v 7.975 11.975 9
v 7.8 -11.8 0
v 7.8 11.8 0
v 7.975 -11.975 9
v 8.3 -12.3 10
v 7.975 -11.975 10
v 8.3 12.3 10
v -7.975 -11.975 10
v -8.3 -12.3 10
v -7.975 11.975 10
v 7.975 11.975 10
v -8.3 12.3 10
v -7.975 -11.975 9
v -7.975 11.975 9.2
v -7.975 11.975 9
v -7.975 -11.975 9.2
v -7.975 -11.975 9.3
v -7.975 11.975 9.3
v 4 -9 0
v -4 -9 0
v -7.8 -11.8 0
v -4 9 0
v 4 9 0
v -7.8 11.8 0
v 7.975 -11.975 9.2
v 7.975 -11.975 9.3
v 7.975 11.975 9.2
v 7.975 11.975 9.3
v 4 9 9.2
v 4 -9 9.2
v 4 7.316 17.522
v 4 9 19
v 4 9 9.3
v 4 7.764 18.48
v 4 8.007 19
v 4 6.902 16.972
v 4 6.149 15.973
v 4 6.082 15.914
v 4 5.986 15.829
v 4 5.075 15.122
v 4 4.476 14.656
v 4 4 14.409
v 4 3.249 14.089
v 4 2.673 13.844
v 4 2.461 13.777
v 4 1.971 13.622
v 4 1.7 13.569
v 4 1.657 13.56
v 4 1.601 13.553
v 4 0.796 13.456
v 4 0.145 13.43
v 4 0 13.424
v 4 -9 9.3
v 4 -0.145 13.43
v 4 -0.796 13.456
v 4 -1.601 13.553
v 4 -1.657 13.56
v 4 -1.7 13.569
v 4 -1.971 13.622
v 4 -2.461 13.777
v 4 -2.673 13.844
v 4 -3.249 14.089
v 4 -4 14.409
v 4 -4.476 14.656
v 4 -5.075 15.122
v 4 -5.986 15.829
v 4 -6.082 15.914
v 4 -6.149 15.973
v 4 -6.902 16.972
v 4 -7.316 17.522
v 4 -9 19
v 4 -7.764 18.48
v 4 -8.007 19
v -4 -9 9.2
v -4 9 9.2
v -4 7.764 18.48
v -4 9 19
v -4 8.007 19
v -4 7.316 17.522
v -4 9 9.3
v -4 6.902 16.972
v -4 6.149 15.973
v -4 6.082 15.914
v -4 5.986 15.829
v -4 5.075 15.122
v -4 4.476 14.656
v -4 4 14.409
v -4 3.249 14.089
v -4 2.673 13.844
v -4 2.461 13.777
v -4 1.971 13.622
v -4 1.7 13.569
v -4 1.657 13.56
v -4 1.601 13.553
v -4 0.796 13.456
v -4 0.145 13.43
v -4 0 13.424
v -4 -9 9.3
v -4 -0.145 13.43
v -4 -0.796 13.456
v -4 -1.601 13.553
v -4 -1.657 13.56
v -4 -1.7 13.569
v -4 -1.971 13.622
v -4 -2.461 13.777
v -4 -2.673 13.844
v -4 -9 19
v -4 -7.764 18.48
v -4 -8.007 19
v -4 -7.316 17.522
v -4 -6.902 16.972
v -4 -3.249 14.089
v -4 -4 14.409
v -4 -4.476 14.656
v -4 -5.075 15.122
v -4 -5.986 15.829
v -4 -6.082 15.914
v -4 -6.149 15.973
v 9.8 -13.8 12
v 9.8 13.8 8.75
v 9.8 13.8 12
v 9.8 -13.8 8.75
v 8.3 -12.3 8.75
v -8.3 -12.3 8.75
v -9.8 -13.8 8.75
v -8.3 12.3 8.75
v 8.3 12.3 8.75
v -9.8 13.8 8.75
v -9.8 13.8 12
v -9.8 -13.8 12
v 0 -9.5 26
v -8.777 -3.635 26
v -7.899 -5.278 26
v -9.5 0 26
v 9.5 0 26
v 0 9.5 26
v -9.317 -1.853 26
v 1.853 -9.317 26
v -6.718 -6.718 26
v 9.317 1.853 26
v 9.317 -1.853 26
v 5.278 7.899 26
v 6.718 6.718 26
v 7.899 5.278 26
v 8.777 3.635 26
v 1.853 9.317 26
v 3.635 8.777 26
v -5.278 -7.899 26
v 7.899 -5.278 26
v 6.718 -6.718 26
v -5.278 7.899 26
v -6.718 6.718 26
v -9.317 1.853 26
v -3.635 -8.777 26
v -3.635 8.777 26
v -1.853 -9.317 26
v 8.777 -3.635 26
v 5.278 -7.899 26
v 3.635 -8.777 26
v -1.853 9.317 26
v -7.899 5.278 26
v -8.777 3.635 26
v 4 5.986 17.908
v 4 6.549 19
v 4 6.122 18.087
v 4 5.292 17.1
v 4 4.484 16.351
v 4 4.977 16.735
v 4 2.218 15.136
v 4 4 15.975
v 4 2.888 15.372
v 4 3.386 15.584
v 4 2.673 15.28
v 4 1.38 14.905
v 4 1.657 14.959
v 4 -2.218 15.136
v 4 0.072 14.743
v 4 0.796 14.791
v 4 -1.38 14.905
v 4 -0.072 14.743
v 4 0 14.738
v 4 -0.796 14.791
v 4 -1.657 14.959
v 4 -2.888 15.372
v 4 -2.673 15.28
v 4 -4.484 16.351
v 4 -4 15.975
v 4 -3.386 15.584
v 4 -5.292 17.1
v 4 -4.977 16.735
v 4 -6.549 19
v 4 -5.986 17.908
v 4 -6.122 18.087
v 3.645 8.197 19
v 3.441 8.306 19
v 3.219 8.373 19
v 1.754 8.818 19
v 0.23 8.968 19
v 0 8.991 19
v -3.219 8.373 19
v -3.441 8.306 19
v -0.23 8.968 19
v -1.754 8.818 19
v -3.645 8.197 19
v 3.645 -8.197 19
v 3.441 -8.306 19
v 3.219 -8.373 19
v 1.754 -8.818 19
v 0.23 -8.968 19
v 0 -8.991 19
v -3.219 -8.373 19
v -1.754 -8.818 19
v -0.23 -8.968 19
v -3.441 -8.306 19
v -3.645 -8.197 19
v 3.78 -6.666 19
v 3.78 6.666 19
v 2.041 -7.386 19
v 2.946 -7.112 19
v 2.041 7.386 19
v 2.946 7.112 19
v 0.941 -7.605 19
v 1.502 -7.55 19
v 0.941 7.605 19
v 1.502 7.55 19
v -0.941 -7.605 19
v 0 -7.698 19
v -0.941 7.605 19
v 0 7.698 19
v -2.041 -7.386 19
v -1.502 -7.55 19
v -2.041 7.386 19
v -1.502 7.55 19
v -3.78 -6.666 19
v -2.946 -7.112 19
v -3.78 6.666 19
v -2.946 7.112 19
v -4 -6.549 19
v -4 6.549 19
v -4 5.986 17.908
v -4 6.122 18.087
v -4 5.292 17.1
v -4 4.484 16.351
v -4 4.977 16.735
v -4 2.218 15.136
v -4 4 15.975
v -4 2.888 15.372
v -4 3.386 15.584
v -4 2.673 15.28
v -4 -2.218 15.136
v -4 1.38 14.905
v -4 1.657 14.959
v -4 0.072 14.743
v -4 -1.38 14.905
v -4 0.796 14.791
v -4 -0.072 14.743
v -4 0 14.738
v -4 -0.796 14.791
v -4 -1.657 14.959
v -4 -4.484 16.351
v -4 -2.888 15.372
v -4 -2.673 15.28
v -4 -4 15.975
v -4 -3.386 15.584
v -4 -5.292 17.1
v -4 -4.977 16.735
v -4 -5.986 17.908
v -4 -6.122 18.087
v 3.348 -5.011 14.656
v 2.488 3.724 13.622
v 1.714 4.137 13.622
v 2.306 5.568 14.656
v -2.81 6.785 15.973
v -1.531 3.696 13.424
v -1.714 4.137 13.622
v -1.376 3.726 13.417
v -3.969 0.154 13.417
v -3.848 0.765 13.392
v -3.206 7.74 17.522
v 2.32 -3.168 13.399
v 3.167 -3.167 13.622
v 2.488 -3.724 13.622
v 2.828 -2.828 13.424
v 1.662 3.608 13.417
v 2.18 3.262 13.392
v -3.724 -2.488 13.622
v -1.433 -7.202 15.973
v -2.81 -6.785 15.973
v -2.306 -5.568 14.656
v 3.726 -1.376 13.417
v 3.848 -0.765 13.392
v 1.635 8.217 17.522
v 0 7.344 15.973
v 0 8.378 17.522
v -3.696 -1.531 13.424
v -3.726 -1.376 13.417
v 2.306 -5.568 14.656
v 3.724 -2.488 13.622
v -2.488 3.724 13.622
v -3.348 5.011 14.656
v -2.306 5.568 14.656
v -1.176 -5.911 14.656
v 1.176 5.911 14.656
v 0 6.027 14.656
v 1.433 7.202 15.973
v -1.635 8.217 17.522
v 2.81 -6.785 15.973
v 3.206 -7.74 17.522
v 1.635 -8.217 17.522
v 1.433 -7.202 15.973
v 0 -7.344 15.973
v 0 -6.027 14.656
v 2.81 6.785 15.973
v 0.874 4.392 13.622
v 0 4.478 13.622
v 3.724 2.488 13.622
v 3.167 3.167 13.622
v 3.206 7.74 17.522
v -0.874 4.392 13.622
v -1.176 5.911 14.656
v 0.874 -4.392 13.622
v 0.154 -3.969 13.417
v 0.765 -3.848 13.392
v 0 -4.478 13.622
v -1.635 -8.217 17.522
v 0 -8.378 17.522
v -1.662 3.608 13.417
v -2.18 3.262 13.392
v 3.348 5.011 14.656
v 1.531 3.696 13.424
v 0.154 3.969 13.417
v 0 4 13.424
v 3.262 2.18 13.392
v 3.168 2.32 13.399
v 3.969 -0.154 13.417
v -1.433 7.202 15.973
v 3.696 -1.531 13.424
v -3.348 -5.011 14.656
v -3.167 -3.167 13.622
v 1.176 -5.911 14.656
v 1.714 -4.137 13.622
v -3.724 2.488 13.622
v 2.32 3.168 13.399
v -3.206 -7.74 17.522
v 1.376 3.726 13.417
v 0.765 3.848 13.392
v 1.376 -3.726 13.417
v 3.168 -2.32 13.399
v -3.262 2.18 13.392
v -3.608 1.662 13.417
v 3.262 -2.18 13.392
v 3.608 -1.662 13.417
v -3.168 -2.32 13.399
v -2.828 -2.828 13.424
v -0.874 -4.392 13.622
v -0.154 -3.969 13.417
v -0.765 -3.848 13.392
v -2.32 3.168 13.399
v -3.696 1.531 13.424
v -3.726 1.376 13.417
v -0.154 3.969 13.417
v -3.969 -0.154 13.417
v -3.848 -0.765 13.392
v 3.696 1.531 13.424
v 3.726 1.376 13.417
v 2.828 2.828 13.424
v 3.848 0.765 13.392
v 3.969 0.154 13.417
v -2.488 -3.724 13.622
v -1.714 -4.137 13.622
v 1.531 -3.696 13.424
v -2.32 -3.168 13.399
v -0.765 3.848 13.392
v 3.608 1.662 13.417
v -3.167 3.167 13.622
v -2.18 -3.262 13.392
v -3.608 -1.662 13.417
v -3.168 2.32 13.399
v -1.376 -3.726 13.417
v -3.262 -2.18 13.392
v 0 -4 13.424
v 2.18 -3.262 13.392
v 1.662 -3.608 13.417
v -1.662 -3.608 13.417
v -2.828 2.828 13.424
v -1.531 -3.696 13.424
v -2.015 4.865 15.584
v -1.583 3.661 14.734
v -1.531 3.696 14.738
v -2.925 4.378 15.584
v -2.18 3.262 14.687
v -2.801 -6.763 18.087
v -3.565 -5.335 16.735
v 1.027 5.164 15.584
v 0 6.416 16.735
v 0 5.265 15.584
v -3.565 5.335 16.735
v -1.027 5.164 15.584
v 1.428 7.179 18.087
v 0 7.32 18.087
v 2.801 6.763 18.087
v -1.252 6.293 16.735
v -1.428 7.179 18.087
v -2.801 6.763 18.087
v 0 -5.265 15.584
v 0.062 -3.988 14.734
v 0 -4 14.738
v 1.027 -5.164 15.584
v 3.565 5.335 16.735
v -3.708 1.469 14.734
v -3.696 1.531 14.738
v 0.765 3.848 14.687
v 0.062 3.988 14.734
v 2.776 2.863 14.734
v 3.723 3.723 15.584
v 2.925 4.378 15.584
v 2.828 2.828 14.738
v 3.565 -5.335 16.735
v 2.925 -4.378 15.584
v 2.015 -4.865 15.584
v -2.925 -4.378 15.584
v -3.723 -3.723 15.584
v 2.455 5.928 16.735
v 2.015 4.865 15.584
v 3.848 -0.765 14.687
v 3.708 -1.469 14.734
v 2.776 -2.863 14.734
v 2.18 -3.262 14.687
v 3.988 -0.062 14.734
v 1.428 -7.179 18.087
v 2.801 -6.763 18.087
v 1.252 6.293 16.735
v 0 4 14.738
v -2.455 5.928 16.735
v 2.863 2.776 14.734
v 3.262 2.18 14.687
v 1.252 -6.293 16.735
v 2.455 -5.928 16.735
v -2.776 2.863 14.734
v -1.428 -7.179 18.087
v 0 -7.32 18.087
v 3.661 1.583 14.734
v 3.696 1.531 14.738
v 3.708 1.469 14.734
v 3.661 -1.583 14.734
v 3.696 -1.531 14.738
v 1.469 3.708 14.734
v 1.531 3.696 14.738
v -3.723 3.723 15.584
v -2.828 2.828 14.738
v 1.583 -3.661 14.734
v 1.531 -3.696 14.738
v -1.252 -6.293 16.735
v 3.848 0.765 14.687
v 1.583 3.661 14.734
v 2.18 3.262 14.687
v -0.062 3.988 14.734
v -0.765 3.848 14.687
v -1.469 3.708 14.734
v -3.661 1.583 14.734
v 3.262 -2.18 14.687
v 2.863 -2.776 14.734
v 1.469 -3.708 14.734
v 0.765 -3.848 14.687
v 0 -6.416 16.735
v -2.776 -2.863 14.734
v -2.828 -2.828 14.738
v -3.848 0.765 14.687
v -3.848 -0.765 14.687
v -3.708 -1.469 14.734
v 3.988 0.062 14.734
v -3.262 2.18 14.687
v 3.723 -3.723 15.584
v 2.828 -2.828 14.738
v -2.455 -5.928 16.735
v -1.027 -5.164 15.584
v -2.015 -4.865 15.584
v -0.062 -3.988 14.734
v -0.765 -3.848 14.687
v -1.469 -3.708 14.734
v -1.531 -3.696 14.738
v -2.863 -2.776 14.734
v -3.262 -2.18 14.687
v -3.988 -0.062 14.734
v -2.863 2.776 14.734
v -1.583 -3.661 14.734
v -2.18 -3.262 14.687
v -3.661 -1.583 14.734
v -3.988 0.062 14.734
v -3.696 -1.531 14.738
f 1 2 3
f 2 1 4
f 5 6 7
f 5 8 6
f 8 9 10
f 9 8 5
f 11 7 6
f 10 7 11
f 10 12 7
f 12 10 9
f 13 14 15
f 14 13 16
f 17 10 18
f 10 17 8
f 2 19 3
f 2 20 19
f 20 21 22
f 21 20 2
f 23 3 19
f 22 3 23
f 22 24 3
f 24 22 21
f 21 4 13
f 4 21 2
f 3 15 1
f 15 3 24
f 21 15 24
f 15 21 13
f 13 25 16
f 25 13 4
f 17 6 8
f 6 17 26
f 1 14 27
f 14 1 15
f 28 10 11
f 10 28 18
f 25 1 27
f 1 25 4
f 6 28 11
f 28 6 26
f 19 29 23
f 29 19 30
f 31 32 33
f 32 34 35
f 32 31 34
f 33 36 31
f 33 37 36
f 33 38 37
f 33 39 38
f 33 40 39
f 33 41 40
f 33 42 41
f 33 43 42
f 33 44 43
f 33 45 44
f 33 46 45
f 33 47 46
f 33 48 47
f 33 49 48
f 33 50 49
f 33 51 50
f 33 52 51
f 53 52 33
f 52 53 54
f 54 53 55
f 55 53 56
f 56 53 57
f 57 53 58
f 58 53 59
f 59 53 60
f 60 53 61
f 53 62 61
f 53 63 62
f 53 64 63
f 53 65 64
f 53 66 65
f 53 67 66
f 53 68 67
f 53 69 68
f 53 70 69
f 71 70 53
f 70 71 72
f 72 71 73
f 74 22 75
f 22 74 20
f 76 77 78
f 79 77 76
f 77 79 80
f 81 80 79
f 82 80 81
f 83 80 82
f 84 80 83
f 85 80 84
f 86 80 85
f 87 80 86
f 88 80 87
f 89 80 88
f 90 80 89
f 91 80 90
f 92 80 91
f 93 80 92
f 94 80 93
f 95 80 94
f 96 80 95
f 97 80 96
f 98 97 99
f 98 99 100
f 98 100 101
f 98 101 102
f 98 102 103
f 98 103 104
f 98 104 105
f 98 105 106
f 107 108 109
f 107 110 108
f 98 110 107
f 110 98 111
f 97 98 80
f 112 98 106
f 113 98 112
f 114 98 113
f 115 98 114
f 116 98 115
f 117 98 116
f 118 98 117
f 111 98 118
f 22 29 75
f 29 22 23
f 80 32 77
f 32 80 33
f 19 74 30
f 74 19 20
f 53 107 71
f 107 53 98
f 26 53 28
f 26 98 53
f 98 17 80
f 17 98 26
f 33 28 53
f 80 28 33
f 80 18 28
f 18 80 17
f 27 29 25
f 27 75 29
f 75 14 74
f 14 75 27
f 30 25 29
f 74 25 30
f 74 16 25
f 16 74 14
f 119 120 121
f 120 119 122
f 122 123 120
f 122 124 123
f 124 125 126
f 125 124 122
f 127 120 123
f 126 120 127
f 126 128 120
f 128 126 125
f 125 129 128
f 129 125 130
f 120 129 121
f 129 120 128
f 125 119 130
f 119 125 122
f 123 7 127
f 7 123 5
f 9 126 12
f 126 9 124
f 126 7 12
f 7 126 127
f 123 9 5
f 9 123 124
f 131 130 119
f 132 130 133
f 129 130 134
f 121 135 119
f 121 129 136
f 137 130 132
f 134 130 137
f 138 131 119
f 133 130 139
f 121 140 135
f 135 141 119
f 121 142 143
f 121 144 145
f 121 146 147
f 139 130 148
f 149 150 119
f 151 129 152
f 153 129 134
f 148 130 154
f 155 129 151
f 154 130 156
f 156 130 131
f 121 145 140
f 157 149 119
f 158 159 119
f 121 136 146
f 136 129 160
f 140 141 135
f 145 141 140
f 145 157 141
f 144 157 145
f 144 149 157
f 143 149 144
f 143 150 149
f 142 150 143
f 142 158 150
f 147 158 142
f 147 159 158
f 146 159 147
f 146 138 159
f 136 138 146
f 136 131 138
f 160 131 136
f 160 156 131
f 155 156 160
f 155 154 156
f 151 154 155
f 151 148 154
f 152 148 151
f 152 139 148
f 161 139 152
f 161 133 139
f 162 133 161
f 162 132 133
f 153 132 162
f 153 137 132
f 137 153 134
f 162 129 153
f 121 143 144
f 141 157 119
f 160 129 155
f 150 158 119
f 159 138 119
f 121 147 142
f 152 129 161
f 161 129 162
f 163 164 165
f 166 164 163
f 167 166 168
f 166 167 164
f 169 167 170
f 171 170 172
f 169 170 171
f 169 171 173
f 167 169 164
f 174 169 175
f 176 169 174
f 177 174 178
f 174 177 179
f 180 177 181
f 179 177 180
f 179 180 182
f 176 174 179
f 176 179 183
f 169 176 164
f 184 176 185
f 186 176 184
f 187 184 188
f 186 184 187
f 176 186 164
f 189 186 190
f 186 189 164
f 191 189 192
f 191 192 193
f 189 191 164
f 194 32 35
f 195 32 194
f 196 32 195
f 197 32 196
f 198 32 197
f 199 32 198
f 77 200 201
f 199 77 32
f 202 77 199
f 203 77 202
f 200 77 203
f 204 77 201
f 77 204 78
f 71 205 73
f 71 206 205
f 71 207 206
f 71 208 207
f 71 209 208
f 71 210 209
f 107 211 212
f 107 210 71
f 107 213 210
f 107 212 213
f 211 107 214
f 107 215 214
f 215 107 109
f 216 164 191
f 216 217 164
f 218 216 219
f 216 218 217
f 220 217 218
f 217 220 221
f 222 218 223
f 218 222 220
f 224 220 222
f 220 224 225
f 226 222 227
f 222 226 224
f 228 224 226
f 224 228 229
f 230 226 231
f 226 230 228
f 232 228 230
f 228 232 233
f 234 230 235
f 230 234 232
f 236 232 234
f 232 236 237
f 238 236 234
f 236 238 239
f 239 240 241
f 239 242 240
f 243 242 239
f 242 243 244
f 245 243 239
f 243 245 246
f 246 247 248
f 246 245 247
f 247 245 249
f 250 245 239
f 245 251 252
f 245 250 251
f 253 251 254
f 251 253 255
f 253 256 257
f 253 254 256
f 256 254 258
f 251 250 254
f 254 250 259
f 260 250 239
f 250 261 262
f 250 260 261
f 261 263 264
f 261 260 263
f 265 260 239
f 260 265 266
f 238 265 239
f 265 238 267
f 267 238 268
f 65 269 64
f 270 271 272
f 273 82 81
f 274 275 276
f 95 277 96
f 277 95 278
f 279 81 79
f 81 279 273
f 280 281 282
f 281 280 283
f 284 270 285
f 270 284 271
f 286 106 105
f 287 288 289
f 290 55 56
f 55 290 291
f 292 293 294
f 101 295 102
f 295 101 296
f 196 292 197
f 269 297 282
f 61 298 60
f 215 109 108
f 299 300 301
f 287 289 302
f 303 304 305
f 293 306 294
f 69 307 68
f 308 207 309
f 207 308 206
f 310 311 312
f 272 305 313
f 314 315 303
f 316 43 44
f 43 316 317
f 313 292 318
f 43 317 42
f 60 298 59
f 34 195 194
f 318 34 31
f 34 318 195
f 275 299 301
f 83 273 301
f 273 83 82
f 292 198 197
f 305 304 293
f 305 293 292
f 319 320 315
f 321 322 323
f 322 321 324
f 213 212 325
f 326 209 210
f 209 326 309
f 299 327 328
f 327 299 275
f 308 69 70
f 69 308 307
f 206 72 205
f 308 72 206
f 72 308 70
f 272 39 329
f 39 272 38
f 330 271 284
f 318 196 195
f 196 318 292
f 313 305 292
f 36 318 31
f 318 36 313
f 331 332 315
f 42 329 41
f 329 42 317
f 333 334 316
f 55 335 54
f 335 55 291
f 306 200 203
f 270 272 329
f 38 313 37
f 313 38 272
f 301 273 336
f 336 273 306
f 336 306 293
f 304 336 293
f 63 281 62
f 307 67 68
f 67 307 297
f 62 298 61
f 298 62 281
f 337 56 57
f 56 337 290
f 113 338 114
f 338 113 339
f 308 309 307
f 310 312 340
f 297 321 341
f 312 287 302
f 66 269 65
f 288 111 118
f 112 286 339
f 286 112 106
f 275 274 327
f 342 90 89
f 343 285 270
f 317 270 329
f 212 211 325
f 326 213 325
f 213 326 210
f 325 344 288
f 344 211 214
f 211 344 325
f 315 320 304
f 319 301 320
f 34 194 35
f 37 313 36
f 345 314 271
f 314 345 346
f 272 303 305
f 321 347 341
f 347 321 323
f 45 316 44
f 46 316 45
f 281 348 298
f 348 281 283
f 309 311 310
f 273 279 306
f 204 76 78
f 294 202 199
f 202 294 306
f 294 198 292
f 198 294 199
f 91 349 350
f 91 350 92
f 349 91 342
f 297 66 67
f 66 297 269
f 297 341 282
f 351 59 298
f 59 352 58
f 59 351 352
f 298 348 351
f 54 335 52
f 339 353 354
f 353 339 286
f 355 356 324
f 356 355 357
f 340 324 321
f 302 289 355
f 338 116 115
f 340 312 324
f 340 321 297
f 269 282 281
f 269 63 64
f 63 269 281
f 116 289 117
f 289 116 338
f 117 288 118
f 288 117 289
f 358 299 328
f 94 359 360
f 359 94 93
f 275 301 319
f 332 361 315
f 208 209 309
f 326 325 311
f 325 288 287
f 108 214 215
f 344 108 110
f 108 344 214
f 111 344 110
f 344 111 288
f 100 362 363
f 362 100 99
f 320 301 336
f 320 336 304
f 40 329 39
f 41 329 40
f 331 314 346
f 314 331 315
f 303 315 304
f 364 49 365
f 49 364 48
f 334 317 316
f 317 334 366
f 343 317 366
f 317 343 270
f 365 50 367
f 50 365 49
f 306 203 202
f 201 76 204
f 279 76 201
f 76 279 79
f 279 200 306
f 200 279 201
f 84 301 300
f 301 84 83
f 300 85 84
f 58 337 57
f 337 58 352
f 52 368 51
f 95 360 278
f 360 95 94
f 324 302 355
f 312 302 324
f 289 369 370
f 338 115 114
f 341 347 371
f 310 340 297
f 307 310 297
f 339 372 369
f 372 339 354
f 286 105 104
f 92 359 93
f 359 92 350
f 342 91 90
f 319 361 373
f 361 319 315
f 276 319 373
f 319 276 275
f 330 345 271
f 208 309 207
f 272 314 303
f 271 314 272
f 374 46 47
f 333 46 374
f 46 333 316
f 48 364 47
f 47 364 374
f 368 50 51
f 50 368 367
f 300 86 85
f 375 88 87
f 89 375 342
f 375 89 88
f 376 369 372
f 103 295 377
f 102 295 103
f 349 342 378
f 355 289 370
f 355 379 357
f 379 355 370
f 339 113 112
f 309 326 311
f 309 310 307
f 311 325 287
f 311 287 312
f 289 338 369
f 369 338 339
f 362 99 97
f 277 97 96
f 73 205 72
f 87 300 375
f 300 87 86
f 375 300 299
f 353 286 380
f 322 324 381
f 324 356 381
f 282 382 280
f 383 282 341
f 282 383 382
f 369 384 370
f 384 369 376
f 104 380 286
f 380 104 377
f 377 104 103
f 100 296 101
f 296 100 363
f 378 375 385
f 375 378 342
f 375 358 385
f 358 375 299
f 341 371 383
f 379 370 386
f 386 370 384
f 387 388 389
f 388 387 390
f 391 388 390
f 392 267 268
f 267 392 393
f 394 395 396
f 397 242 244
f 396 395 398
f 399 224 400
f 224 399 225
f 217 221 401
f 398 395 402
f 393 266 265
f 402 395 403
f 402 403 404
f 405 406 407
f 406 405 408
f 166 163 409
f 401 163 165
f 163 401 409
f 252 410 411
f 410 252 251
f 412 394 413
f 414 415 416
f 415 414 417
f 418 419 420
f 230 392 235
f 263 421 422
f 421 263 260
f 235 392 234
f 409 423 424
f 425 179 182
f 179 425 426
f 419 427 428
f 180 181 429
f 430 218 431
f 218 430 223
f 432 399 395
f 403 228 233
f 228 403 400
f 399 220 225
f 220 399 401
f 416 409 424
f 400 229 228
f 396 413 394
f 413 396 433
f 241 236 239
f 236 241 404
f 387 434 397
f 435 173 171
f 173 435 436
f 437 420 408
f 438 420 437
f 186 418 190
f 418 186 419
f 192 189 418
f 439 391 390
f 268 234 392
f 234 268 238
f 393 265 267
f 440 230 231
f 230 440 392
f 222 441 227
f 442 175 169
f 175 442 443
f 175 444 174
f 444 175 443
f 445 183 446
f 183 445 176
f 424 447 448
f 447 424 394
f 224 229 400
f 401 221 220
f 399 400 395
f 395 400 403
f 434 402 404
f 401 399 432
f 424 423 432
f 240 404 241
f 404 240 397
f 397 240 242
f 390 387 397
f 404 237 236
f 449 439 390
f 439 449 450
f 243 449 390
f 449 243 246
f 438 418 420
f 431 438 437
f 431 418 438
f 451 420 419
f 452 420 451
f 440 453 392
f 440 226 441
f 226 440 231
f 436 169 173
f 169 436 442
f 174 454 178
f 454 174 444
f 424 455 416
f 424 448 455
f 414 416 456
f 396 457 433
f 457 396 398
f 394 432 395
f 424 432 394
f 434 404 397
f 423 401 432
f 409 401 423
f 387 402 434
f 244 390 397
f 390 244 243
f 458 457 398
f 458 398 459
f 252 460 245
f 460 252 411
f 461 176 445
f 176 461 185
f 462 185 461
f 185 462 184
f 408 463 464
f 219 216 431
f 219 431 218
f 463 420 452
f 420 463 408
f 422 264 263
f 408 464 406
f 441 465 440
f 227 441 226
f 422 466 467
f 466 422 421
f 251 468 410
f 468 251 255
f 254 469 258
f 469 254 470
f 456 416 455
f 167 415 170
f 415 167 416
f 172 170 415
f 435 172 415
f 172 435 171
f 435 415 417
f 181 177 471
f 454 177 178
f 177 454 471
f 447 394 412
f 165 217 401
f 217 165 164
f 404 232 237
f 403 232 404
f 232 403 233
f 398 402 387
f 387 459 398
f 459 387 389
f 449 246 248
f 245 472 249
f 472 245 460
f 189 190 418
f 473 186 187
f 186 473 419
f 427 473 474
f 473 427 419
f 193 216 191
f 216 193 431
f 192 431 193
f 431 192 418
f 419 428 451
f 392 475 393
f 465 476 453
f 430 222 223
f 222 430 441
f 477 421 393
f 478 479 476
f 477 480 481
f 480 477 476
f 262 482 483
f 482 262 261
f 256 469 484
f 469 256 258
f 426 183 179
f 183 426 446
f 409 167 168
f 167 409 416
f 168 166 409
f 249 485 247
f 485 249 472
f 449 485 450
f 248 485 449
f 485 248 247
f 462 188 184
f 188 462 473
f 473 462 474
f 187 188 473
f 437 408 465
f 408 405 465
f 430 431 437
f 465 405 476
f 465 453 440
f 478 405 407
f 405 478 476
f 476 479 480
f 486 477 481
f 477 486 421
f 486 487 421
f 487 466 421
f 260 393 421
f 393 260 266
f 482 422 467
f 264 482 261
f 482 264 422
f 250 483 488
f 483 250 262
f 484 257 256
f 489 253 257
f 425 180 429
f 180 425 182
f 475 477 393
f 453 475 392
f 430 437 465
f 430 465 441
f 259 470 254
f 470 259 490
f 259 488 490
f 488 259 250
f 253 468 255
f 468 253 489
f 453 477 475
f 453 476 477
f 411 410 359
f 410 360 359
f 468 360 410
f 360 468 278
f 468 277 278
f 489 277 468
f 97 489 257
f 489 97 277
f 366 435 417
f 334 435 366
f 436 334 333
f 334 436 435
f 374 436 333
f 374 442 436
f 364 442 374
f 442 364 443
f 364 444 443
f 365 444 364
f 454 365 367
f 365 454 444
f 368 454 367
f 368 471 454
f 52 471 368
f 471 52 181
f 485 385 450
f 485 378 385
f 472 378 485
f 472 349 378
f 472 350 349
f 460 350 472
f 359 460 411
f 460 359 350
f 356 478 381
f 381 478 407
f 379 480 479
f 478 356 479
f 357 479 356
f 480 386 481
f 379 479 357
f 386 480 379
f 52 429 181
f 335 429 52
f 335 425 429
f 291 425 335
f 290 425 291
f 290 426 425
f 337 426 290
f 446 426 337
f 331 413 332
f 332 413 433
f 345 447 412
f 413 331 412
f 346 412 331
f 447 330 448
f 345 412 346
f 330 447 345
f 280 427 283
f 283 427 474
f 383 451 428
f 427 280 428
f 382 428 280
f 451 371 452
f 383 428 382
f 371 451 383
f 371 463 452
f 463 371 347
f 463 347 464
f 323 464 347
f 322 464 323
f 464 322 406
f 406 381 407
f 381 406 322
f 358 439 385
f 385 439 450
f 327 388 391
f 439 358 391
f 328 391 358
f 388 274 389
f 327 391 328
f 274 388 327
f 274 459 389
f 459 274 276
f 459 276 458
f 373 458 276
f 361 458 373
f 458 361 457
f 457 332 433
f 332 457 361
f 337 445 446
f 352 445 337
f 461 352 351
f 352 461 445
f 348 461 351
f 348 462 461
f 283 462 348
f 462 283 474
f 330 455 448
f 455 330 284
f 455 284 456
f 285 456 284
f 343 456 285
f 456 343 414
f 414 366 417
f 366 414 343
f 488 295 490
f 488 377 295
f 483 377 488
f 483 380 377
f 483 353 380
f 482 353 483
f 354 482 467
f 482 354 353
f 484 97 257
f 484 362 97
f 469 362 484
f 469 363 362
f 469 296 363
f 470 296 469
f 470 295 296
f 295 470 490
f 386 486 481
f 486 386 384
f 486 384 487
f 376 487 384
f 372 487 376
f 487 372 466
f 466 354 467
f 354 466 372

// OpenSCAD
// file: sleds.scad
// ==========================================
// Xentient Framework - Universal Sled & Socket Library
// Shared modules for all peripheral caps
// ==========================================
// Per Framework §2: Universal Mating Protocol
// Female Socket (in hub): 24.0×16.0×10.0mm, wire channel 18×8mm
// Male Sled (on cap base): 23.6×15.6×10.0mm, 1° draft, hollow 18×8mm
// Units: mm

$fn = 64;

// ==========================================
// MALE SLED PARAMETERS
// ==========================================

Sled_W       = 23.6;    // Width (0.4mm tolerance in female 24.0mm)
Sled_H       = 15.6;    // Height (0.4mm tolerance in female 16.0mm)
Sled_D       = 10.0;    // Depth (insertion length)
Sled_Draft   = 1.0;     // 1-degree draft angle
Sled_Wire_W  = 18.0;    // Wire pass-through width
Sled_Wire_H  = 8.0;     // Wire pass-through height
Sled_Wall    = 2.0;     // Minimum wall thickness

// Derived
Sled_Draft_Off = Sled_D * tan(Sled_Draft);  // ~0.17mm per side

// ==========================================
// MODULE: male_sled()
// The plug base that inserts into the hub's female socket.
// All caps start with this at their base.
//
// Usage: difference() { male_sled(); /* your cap-specific cutouts */ }
// ==========================================

module male_sled() {
    difference() {
        // Outer body with 1° draft
        hull() {
            // Entry face (slightly larger for wedge fit)
            translate([0, 0, Sled_D - 0.5])
                cube([Sled_H + 2*Sled_Draft_Off,
                      Sled_W + 2*Sled_Draft_Off,
                      1], center=true);
            // Inner face (exact size)
            translate([0, 0, 0.5])
                cube([Sled_H, Sled_W, 1], center=true);
        }

        // Wire pass-through (hollow core)
        translate([0, 0, Sled_D / 2])
            cube([Sled_Wire_H, Sled_Wire_W, Sled_D + 2], center=true);

        // Entry chamfer (45° for easy insertion)
        chamfer_h = 1.5;
        translate([0, 0, Sled_D - chamfer_h/2])
            hull() {
                cube([Sled_H + 2*chamfer_h, Sled_W + 2*chamfer_h, 0.1], center=true);
                cube([Sled_H, Sled_W, 0.1], center=true);
            }
    }
}

// ==========================================
// MODULE: male_sled_with_flange()
// Adds a flange around the sled base for cap-to-hub transition.
// Flange sits flush against hub exterior face.
//
// flange_w: extra width beyond sled on each side
// flange_h: extra height beyond sled on each side
// flange_t: flange thickness
// ==========================================

module male_sled_with_flange(flange_w=2.0, flange_h=2.0, flange_t=2.0) {
    union() {
        male_sled();

        // Flange ring around sled entry
        translate([0, 0, Sled_D])
            difference() {
                cube([Sled_H + 2*flange_h,
                      Sled_W + 2*flange_w,
                      flange_t], center=true);
                // Cut sled opening through flange
                cube([Sled_H + 1, Sled_W + 1, flange_t + 2], center=true);
            }
    }
}

// ==========================================
// MODULE: wire_channel()
// Internal wire routing channel from sled to component.
// Extends from sled core outward through the cap body.
//
// length: distance from sled to component
// direction: "straight" or "angled"
// ==========================================

module wire_channel(length=15, direction="straight") {
    if (direction == "straight") {
        translate([0, 0, Sled_D / 2 + length / 2])
            cube([Sled_Wire_H, Sled_Wire_W, length + 1], center=true);
    }
}

// ==========================================
// VISUALIZATION HELPERS
// ==========================================

// Render just the sled for testing
// male_sled();
// main file
// ==========================================
// Xentient Framework - Housing 5: Sight (ESP32-CAM)
// Articulated ball-joint head with lens cutout
// ==========================================
// Component: ESP32-CAM-MB dual-board (40×27mm)
// Connection: 4-pin JST XH pigtail (UART: VCC, GND, TX, RX)
// Socket: 30° face (high visibility, clear line of sight)
// Per Framework §4 Housing 5
// IMPORTANT: Thin wall (<1.5mm) near WiFi antenna trace
// IMPORTANT: UART2 remap to GPIO2(TX)/GPIO12(RX) per hardware validation
// Units: mm

include <sleds.scad>;

$fn = 64;

// ==========================================
// COMPONENT DIMENSIONS
// ==========================================

CAM_Board_W  = 27.0;   // ESP32-CAM-MB board width
CAM_Board_H  = 40.0;   // ESP32-CAM-MB board height (dual-board)
CAM_Board_T  = 1.6;    // PCB thickness
CAM_Lens_D   = 8.0;    // OV2640 lens diameter
CAM_Ant_W    = 12.0;   // WiFi antenna trace width
CAM_Ant_H    = 8.0;    // WiFi antenna trace height

// Ball joint dimensions
Ball_R       = 8.0;    // Ball radius
Socket_R     = Ball_R + 1.5;  // Socket radius (1.5mm wall)
Socket_Depth = Ball_R * 0.7;  // Socket depth (captures ~70% of ball)
Artic_Range  = 25;     // Degrees of articulation each direction

// Housing dimensions
Head_W       = 32.0;   // Camera head width (27mm board + walls)
Head_H       = 45.0;   // Camera head height (40mm board + lens)
Head_D       = 14.0;   // Camera head depth
House_Wall   = 2.0;    // Standard wall
Ant_Wall     = 1.2;    // Thin wall near antenna (CRITICAL)

// ==========================================
// MODULE: housing_sight()
// Sled → Neck → Ball Socket → Camera Head
// ==========================================

module housing_sight() {
    union() {
        // Sled base with flange
        male_sled_with_flange(flange_w=2.0, flange_h=2.0, flange_t=2.5);

        // Neck from sled to ball socket
        translate([0, 0, Sled_D]) {
            difference() {
                // Neck body
                hull() {
                    translate([0, 0, 1])
                        cube([Sled_H + 4, Sled_W + 4, 2], center=true);
                    translate([0, 0, 12])
                        cylinder(h=4, d=Socket_R * 2, $fn=32);
                }
                // Wire channel through neck
                translate([0, 0, -1])
                    cube([Sled_Wire_H, Sled_Wire_W, 20], center=true);
            }

            // Ball socket base (on top of neck)
            translate([0, 0, 12]) {
                difference() {
                    // Socket housing
                    sphere(r=Socket_R, $fn=32);
                    // Ball cutout (concave)
                    sphere(r=Ball_R + 0.3, $fn=32);  // 0.3mm clearance
                    // Opening for head to rotate
                    translate([0, 0, Socket_R])
                        cube([Ball_R * 2 + 2, Ball_R * 2 + 2, Socket_R * 2], center=true);
                    // Wire channel through socket
                    translate([0, 0, -Socket_R])
                        cylinder(h=Socket_R * 2, d=Sled_Wire_H, $fn=16);
                }
            }
        }
    }
}

// ==========================================
// MODULE: camera_head()
// Separate print — snaps onto ball joint
// Per Framework: Male Sled terminates in Ball Joint.
// Camera housing features the Socket.
// This module is the camera head with ball on back.
// ==========================================

module camera_head() {
    difference() {
        union() {
            // Camera head body
            cube([Head_W, Head_H, Head_D], center=true);

            // Ball on back face (mates with socket on sled)
            translate([0, 0, -Head_D/2 - Ball_R + 1])
                sphere(r=Ball_R, $fn=32);
        }

        // Inner cavity (board + wiring)
        translate([0, 2, 0])
            cube([CAM_Board_W + 0.4, CAM_Board_H + 0.4, Head_D - 2*House_Wall], center=true);

        // Lens cutout (front face)
        translate([0, 4, Head_D/2])
            cylinder(h=House_Wall + 2, d=CAM_Lens_D + 0.3, center=true, $fn=32);

        // WiFi antenna zone — THIN WALL (CRITICAL: <1.5mm)
        // Antenna is at top of board, opposite lens
        translate([0, Head_H/2 - CAM_Ant_H/2 - 2, 0])
            difference() {
                cube([CAM_Ant_W + 4, CAM_Ant_H + 4, Head_D + 4], center=true);
                // Keep only thin wall on outer face
                translate([0, House_Wall/2 + Ant_Wall/2, 0])
                    cube([CAM_Ant_W + 2, CAM_Ant_H + 2, Head_D + 2], center=true);
            }

        // Wire channel from board area to ball
        translate([0, -5, -Head_D/2 - Ball_R])
            cylinder(h=Ball_R + Head_D/2, d=Sled_Wire_H, $fn=16);

        // M2 screw holes for board mounting (2 holes, top)
        for (sx = [-1, 1]) {
            translate([sx * (CAM_Board_W/2 - 3), -Head_H/2 + 5, 0])
                cylinder(h=Head_D + 2, d=2.4, center=true, $fn=16);
        }
    }
}

// ==========================================
// RENDER
// For testing: show both parts
// housing_sight() is the sled+socket (prints attached to hub)
// camera_head() is the head+ball (prints separately)
// ==========================================

// Render socket side (attached to sled)
housing_sight();

// Render camera head offset for visualization
%translate([0, 0, 35]) rotate([0, 180, 0]) camera_head();
